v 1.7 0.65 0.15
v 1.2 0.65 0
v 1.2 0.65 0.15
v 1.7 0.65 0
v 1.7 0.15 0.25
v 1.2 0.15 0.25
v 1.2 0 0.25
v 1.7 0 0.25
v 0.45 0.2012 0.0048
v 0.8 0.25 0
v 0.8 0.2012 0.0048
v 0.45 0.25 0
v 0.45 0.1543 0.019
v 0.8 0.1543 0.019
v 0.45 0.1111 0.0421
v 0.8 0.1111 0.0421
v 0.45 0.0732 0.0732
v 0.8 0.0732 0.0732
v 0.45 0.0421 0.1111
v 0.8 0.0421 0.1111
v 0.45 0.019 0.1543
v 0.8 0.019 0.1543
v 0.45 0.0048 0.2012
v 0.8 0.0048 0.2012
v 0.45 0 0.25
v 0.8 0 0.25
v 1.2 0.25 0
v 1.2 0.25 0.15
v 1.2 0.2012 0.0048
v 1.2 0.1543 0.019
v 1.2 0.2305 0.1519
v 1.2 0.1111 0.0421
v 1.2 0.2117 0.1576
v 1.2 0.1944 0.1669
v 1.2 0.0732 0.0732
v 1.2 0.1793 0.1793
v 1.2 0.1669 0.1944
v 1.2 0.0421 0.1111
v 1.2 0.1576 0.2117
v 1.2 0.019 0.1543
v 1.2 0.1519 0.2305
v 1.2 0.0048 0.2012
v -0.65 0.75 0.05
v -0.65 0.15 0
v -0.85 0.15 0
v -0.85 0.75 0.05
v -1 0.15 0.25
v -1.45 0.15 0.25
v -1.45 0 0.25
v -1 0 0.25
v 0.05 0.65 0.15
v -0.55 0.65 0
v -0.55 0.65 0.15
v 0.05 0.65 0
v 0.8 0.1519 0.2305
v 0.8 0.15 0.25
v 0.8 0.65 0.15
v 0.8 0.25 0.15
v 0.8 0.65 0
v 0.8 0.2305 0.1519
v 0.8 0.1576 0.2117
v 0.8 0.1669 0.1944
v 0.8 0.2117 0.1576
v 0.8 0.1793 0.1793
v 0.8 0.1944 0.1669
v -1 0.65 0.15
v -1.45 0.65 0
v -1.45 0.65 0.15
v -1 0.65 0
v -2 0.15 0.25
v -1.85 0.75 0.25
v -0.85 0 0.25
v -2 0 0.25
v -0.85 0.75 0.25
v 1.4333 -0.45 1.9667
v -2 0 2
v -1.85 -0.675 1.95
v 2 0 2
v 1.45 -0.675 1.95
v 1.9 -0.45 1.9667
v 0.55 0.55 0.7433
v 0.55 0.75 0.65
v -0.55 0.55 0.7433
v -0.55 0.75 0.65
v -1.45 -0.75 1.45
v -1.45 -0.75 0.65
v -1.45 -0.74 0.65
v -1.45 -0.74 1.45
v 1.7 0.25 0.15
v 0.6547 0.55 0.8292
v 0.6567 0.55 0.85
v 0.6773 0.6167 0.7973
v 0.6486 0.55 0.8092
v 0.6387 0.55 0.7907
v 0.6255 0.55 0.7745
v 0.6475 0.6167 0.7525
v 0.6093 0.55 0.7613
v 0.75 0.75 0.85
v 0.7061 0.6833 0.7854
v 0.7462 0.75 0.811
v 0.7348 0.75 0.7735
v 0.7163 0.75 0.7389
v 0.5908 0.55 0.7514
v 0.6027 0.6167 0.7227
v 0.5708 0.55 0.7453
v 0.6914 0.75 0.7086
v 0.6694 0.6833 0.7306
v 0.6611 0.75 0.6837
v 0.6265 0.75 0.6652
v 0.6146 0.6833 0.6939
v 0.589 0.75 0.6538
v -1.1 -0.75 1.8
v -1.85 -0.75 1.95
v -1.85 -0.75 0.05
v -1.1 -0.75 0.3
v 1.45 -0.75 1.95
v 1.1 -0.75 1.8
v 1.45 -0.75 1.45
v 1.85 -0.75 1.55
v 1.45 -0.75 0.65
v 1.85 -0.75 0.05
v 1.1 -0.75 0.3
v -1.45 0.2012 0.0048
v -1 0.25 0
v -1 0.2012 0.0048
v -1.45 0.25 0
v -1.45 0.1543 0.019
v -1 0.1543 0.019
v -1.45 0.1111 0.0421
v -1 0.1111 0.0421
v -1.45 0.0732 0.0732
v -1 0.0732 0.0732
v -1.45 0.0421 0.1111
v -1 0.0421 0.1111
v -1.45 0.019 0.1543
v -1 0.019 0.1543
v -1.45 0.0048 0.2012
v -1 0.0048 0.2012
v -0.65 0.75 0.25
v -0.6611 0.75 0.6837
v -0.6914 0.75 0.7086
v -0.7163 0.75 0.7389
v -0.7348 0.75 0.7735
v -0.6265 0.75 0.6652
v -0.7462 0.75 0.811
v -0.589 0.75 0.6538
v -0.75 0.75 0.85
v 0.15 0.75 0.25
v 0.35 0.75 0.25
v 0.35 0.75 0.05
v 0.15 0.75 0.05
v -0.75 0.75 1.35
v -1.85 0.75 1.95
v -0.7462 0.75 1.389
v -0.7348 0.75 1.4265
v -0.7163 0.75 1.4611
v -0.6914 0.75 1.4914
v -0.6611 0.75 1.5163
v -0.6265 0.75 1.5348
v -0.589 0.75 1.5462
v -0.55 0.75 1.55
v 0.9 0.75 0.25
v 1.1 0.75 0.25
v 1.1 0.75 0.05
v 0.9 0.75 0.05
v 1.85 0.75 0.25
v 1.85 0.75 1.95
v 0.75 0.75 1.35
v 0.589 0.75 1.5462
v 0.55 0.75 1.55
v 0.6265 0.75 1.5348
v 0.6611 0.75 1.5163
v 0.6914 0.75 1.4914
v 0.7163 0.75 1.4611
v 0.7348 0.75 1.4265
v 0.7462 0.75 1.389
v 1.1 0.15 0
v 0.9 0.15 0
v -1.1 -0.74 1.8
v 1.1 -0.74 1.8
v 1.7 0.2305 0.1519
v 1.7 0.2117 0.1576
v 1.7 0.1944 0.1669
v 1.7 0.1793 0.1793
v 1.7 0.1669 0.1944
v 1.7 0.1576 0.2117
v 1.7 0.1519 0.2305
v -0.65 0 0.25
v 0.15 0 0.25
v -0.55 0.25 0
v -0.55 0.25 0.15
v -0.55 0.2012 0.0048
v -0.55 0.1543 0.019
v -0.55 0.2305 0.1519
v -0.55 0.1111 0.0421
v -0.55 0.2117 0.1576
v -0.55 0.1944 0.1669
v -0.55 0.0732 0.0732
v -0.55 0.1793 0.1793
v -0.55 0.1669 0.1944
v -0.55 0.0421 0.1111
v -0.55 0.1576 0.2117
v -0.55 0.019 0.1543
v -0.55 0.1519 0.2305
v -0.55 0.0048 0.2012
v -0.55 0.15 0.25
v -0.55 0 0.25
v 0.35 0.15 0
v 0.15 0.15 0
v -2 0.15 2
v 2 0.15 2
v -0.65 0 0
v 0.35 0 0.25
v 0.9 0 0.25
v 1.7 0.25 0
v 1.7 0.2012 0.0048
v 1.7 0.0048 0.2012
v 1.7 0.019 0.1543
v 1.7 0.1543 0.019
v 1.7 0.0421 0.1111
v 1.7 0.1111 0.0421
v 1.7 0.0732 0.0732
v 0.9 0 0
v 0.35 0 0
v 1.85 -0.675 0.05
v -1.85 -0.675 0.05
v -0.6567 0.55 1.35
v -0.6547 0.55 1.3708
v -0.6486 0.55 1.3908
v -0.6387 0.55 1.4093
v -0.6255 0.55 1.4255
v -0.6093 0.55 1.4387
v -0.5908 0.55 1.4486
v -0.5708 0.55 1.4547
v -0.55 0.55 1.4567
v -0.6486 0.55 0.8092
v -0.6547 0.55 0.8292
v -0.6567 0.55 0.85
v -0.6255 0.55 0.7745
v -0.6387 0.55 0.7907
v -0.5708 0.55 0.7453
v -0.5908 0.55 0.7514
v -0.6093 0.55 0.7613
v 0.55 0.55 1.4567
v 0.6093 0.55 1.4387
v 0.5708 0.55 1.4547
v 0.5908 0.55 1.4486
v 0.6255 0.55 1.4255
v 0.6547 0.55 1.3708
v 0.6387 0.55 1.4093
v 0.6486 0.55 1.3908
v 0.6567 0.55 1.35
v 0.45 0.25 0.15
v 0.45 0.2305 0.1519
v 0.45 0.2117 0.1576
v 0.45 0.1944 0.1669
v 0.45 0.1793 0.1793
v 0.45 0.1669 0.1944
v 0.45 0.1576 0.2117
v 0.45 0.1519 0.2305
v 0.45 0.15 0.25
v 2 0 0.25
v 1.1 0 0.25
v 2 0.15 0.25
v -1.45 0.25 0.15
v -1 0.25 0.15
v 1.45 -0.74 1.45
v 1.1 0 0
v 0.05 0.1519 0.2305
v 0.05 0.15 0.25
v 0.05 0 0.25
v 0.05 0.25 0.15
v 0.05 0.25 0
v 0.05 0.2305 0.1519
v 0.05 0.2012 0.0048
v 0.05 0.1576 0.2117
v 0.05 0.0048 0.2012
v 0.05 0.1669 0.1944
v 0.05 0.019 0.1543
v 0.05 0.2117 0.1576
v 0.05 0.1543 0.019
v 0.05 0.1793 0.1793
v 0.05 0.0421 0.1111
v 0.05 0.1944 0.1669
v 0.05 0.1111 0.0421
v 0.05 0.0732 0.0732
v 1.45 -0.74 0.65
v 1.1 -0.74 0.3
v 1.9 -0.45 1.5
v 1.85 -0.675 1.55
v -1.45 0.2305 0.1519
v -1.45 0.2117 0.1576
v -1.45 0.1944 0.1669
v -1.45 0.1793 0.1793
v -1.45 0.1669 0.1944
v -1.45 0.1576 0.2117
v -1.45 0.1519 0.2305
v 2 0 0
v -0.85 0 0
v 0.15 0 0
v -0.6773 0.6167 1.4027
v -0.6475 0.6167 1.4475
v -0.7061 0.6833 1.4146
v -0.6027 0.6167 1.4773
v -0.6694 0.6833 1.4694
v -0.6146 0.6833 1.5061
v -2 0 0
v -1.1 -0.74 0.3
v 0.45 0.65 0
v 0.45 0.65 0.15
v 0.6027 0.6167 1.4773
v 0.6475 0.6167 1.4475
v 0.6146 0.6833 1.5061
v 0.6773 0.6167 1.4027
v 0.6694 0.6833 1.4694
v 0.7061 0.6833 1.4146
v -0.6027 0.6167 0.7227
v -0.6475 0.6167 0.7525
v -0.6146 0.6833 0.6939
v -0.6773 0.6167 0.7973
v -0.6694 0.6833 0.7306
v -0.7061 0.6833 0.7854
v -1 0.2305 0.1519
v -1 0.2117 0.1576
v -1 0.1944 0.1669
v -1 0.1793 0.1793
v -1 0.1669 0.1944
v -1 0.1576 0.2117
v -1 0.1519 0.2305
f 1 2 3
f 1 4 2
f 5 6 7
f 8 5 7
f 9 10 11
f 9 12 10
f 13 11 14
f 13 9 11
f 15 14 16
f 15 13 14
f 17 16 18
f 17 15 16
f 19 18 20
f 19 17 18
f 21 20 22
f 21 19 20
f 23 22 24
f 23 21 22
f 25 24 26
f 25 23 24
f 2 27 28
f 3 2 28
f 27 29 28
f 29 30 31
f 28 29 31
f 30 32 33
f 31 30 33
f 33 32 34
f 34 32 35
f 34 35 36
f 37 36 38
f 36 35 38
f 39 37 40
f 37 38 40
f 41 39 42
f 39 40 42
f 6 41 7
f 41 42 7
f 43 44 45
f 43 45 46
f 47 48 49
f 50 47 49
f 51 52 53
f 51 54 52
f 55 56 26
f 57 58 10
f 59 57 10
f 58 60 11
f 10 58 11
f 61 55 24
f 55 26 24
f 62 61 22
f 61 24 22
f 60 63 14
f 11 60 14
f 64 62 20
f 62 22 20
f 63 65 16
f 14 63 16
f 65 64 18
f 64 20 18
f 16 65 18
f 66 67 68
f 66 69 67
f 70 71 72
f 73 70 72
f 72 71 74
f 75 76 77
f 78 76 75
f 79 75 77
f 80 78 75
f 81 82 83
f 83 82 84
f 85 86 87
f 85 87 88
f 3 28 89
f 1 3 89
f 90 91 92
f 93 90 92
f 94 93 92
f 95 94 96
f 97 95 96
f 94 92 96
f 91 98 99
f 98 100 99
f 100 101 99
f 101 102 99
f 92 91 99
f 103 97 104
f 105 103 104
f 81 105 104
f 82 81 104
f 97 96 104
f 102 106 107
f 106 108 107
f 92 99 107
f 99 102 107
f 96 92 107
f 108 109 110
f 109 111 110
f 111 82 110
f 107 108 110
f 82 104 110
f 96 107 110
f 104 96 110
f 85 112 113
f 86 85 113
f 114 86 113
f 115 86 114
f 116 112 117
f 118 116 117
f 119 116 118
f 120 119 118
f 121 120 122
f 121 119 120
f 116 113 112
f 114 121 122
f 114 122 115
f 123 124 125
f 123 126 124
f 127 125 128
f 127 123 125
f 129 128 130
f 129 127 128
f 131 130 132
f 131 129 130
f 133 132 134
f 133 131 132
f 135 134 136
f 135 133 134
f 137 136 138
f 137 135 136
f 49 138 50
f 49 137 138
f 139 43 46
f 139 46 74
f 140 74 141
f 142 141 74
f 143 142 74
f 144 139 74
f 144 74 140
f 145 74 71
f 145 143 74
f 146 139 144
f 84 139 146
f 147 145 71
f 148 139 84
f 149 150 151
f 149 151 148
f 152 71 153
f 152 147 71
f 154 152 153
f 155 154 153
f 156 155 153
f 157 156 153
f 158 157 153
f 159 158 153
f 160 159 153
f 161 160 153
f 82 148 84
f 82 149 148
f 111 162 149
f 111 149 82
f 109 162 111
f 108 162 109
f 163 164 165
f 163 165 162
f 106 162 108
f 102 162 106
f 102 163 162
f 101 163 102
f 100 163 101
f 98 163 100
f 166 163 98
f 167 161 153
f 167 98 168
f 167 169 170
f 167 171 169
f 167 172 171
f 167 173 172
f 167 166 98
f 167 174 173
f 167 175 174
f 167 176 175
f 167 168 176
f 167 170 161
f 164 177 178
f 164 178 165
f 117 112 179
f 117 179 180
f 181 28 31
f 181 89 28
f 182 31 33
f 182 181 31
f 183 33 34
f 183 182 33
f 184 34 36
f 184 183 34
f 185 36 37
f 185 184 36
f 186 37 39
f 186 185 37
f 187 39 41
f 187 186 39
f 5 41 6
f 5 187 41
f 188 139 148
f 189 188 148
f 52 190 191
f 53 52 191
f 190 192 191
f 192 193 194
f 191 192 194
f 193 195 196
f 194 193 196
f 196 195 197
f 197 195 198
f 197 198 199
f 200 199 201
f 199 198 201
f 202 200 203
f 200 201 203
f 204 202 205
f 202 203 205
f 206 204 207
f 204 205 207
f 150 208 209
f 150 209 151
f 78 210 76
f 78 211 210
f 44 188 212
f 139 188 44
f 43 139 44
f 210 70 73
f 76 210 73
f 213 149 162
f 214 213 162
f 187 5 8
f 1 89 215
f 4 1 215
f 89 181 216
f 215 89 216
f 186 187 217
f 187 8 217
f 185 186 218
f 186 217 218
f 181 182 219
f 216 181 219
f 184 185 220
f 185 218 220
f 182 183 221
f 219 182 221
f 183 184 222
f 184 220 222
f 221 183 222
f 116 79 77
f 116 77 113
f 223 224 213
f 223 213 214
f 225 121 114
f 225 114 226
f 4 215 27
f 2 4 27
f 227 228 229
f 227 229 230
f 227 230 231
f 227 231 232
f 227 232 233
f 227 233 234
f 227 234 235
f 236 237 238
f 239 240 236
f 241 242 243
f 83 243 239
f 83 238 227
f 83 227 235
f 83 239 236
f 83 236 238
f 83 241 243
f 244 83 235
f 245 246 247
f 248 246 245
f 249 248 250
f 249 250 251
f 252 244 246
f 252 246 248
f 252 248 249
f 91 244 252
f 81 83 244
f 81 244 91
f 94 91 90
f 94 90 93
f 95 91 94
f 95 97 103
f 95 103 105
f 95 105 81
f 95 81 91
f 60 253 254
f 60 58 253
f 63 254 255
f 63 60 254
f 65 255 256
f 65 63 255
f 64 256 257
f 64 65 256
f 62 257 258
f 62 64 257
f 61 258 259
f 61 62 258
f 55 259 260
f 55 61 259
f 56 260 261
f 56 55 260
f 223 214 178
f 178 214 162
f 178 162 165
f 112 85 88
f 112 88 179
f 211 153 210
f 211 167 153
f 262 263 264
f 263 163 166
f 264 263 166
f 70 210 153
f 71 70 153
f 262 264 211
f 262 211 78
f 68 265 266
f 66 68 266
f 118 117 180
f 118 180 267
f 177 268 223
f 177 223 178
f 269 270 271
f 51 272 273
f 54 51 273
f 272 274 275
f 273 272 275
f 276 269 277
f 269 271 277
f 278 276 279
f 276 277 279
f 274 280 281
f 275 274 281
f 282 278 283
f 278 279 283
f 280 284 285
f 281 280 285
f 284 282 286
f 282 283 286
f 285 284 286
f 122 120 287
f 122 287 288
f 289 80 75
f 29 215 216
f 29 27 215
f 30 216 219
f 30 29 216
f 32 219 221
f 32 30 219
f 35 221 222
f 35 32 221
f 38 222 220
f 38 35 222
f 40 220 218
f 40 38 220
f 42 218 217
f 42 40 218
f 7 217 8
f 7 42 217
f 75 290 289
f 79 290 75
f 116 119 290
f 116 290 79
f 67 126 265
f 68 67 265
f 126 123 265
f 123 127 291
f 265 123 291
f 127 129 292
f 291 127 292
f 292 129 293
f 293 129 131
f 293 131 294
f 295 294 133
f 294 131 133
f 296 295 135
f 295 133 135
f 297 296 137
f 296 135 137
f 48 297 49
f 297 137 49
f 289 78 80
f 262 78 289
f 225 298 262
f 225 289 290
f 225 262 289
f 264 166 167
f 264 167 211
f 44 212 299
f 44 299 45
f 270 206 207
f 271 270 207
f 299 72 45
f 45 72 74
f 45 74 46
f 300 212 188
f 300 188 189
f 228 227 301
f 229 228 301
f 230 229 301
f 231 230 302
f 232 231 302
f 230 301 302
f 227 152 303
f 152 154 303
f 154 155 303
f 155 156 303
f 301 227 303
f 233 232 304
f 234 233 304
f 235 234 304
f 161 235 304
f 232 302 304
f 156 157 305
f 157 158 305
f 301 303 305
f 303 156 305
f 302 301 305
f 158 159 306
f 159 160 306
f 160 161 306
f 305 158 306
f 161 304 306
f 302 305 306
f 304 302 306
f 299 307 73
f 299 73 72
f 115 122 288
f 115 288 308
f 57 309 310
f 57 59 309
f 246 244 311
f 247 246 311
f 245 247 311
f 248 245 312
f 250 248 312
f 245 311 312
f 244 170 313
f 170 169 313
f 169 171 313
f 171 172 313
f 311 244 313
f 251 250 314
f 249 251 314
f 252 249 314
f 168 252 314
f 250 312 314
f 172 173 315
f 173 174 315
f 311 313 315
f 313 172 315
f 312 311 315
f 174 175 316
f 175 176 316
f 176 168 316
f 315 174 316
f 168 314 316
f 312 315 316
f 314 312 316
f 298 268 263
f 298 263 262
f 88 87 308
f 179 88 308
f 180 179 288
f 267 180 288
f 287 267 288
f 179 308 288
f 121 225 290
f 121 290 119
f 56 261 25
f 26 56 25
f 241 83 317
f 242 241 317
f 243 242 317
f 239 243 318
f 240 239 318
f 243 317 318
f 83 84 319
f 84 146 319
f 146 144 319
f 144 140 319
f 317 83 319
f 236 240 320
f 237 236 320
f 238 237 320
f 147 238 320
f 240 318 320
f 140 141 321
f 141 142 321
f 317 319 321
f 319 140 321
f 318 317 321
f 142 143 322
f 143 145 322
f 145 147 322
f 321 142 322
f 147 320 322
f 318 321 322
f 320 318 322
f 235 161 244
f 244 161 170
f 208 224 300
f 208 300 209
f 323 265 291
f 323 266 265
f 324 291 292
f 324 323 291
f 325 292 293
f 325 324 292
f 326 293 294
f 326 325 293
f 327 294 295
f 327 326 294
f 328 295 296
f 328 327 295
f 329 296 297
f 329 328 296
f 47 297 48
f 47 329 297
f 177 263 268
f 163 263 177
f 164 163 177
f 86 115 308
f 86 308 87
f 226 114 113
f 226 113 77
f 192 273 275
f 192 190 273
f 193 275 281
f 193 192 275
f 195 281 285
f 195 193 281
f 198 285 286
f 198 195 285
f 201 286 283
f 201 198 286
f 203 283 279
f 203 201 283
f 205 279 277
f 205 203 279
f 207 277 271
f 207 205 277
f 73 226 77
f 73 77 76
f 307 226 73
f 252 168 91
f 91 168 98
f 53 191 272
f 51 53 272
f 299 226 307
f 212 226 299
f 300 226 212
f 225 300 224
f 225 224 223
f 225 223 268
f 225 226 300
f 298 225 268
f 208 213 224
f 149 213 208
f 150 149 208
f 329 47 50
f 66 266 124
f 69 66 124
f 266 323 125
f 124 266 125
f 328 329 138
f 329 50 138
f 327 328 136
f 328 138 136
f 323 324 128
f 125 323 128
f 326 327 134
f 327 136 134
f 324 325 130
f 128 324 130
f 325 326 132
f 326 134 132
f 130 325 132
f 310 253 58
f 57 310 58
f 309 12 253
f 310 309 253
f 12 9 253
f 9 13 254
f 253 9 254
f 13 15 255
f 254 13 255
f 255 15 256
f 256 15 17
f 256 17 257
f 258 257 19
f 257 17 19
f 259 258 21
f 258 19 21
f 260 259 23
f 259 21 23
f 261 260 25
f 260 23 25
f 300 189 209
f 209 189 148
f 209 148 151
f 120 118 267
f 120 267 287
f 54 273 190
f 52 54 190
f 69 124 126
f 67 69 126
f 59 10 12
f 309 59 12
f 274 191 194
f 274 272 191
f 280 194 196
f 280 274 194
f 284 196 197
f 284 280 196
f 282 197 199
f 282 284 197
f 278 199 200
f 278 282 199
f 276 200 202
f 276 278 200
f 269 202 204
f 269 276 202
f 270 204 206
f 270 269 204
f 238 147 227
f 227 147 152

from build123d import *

# Parameters (mm, degrees)
EXTRUDE_1_DEPTH     = 2
SKETCH_2_OUTSIDE_W  = 6.944
SKETCH_2_OUTSIDE_H  = 4.444
CUT_EXTRUDE_1_DEPTH = 3.926174978
CUT_EXTRUDE_2_DEPTH = 0.3
SKETCH_6_W          = 0.6
SKETCH_6_H          = 0.15
SKETCH_6_W_2        = 0.45
SKETCH_6_W_3        = 0.35
SKETCH_6_W_4        = 0.5
SKETCH_5_W          = 0.8
SKETCH_5_H          = 0.25
SKETCH_5_W_2        = 1.15
SKETCH_5_W_3        = 0.55
SKETCH_5_W_4        = 0.9
CUT_EXTRUDE_4_DEPTH = 0.75
CUT_EXTRUDE_5_DEPTH = 0.2
CUT_EXTRUDE_5_DRAFT = -25
CUT_EXTRUDE_6_DEPTH = 0.01


with BuildPart() as part:
    # Эскиз1 → Бобышка-Вытянуть1 (new, symmetric)
    with BuildSketch(Plane(origin=(0, 0, 0), x_dir=(0, -1, 0), z_dir=(1, 0, 0))):
        Polygon((-0.15, -2), (0, -2), (0.675, -1.95), (0.75, -1.95), (0.75, -0.05), (0.675, -0.05), (0, 0), (-0.15, 0), (-0.75, -0.05), (-0.75, -1.95), align=None)
    extrude(amount=EXTRUDE_1_DEPTH, both=True)

    # Эскиз2 outside → Вырез-Вытянуть1 (cut, through all)
    with BuildSketch(Plane.XY):
        Rectangle(SKETCH_2_OUTSIDE_W, SKETCH_2_OUTSIDE_H)
        Polygon((2, 0), (1.85, -0.675), (1.85, -0.75), (-1.85, -0.75), (-1.85, -0.675), (-2, 0), (-2, 0.15), (-1.85, 0.75), (1.85, 0.75), (2, 0.15), align=None, mode=Mode.SUBTRACT)
    extrude(amount=CUT_EXTRUDE_1_DEPTH, mode=Mode.SUBTRACT)

    # Эскиз4 → Вырез-Вытянуть2 (cut)
    with BuildSketch(Plane.XZ.offset(0.75)):
        Polygon((2, 2), (2, 1.4), (1.4, 2), align=None)
    extrude(amount=-CUT_EXTRUDE_2_DEPTH, mode=Mode.SUBTRACT)

    # Эскиз5 → Вырез-Вытянуть4 (cut)
    with BuildSketch(Plane(origin=(0, 0.75, 0), x_dir=(1, 0, 0), z_dir=(0, 1, 0))):
        with Locations((-0.25, -0.125)):
            Rectangle(SKETCH_5_W, SKETCH_5_H)
        with Locations((-1.425, -0.125)):
            Rectangle(SKETCH_5_W_2, SKETCH_5_H)
        with Locations((0.625, -0.125)):
            Rectangle(SKETCH_5_W_3, SKETCH_5_H)
        with Locations((1.55, -0.125)):
            Rectangle(SKETCH_5_W_4, SKETCH_5_H)
    extrude(amount=-CUT_EXTRUDE_4_DEPTH, mode=Mode.SUBTRACT)


with BuildPart() as body_2:
    # По траектории3: sweep along a path in Эскиз7
    with BuildLine(Plane(origin=(0, 0, 0), x_dir=(0, 0, -1), z_dir=(1, 0, 0))) as sweep_3_path:
        Line((0, 0.65), (0, 0.25))
        ThreePointArc((0, 0.25), (-0.073223305, 0.073223305), (-0.25, 0))
    # Эскиз6 → По траектории3 (sweep)
    with BuildSketch(Plane(origin=(0, 0.65, 0), x_dir=(1, 0, 0), z_dir=(0, 1, 0))):
        with Locations((-0.25, -0.075)):
            Rectangle(SKETCH_6_W, SKETCH_6_H)
        with Locations((-1.225, -0.075)):
            Rectangle(SKETCH_6_W_2, SKETCH_6_H)
        with Locations((0.625, -0.075)):
            Rectangle(SKETCH_6_W_3, SKETCH_6_H)
        with Locations((1.45, -0.075)):
            Rectangle(SKETCH_6_W_4, SKETCH_6_H)
    sweep(path=sweep_3_path.line)


with BuildPart() as cut_extrude_5_tool:
    # Эскиз9 → Вырез-Вытянуть5 (with draft: the straight prism first)
    with BuildSketch(Plane(origin=(0, 0.75, 0), x_dir=(1, 0, 0), z_dir=(0, 1, 0))):
        with BuildLine():
            ThreePointArc((-0.55, -0.65), (-0.691421356, -0.708578644), (-0.75, -0.85))
            Line((-0.75, -0.85), (-0.75, -1.35))
            ThreePointArc((-0.75, -1.35), (-0.691421356, -1.491421356), (-0.55, -1.55))
            Line((-0.55, -1.55), (0.55, -1.55))
            ThreePointArc((0.55, -1.55), (0.691421356, -1.491421356), (0.75, -1.35))
            Line((0.75, -1.35), (0.75, -0.85))
            ThreePointArc((0.75, -0.85), (0.691421356, -0.708578644), (0.55, -0.65))
            Line((0.55, -0.65), (-0.55, -0.65))
        make_face()
    extrude(amount=-CUT_EXTRUDE_5_DEPTH)
    # Вырез-Вытянуть5: the draft: its side faces are tilted about the plane it starts from
    cut_extrude_5_sides = [cut_extrude_5_tool.faces().sort_by_distance(p)[0] for p in [
        (-0.691421356, 0.65, 0.708578644),
        (-0.75, 0.65, 1.1),
        (-0.691421356, 0.65, 1.491421356),
        (0, 0.65, 1.55),
        (0.691421356, 0.65, 1.491421356),
        (0.75, 0.65, 1.1),
        (0.691421356, 0.65, 0.708578644),
        (0, 0.65, 0.65),
    ]]
    draft(cut_extrude_5_sides, Plane(origin=(0, 0.75, 0), x_dir=(1, 0, 0), z_dir=(0, 1, 0)), CUT_EXTRUDE_5_DRAFT)


with BuildPart() as part_1:
    add(part.part)

    # Вырез-Вытянуть5: cut by cut_extrude_5_tool
    add(cut_extrude_5_tool.part, mode=Mode.SUBTRACT)

    # Эскиз10 → Вырез-Вытянуть6 (cut)
    with BuildSketch(Plane(origin=(0, -0.75, 0), x_dir=(-1, 0, 0), z_dir=(0, -1, 0))):
        Polygon((1.1, -1.8), (-1.1, -1.8), (-1.45, -1.45), (-1.45, -0.65), (-1.1, -0.3), (1.1, -0.3), (1.45, -0.65), (1.45, -1.45), align=None)
    extrude(amount=-CUT_EXTRUDE_6_DEPTH, mode=Mode.SUBTRACT)


solid = Compound([body_2.part, part_1.part])
